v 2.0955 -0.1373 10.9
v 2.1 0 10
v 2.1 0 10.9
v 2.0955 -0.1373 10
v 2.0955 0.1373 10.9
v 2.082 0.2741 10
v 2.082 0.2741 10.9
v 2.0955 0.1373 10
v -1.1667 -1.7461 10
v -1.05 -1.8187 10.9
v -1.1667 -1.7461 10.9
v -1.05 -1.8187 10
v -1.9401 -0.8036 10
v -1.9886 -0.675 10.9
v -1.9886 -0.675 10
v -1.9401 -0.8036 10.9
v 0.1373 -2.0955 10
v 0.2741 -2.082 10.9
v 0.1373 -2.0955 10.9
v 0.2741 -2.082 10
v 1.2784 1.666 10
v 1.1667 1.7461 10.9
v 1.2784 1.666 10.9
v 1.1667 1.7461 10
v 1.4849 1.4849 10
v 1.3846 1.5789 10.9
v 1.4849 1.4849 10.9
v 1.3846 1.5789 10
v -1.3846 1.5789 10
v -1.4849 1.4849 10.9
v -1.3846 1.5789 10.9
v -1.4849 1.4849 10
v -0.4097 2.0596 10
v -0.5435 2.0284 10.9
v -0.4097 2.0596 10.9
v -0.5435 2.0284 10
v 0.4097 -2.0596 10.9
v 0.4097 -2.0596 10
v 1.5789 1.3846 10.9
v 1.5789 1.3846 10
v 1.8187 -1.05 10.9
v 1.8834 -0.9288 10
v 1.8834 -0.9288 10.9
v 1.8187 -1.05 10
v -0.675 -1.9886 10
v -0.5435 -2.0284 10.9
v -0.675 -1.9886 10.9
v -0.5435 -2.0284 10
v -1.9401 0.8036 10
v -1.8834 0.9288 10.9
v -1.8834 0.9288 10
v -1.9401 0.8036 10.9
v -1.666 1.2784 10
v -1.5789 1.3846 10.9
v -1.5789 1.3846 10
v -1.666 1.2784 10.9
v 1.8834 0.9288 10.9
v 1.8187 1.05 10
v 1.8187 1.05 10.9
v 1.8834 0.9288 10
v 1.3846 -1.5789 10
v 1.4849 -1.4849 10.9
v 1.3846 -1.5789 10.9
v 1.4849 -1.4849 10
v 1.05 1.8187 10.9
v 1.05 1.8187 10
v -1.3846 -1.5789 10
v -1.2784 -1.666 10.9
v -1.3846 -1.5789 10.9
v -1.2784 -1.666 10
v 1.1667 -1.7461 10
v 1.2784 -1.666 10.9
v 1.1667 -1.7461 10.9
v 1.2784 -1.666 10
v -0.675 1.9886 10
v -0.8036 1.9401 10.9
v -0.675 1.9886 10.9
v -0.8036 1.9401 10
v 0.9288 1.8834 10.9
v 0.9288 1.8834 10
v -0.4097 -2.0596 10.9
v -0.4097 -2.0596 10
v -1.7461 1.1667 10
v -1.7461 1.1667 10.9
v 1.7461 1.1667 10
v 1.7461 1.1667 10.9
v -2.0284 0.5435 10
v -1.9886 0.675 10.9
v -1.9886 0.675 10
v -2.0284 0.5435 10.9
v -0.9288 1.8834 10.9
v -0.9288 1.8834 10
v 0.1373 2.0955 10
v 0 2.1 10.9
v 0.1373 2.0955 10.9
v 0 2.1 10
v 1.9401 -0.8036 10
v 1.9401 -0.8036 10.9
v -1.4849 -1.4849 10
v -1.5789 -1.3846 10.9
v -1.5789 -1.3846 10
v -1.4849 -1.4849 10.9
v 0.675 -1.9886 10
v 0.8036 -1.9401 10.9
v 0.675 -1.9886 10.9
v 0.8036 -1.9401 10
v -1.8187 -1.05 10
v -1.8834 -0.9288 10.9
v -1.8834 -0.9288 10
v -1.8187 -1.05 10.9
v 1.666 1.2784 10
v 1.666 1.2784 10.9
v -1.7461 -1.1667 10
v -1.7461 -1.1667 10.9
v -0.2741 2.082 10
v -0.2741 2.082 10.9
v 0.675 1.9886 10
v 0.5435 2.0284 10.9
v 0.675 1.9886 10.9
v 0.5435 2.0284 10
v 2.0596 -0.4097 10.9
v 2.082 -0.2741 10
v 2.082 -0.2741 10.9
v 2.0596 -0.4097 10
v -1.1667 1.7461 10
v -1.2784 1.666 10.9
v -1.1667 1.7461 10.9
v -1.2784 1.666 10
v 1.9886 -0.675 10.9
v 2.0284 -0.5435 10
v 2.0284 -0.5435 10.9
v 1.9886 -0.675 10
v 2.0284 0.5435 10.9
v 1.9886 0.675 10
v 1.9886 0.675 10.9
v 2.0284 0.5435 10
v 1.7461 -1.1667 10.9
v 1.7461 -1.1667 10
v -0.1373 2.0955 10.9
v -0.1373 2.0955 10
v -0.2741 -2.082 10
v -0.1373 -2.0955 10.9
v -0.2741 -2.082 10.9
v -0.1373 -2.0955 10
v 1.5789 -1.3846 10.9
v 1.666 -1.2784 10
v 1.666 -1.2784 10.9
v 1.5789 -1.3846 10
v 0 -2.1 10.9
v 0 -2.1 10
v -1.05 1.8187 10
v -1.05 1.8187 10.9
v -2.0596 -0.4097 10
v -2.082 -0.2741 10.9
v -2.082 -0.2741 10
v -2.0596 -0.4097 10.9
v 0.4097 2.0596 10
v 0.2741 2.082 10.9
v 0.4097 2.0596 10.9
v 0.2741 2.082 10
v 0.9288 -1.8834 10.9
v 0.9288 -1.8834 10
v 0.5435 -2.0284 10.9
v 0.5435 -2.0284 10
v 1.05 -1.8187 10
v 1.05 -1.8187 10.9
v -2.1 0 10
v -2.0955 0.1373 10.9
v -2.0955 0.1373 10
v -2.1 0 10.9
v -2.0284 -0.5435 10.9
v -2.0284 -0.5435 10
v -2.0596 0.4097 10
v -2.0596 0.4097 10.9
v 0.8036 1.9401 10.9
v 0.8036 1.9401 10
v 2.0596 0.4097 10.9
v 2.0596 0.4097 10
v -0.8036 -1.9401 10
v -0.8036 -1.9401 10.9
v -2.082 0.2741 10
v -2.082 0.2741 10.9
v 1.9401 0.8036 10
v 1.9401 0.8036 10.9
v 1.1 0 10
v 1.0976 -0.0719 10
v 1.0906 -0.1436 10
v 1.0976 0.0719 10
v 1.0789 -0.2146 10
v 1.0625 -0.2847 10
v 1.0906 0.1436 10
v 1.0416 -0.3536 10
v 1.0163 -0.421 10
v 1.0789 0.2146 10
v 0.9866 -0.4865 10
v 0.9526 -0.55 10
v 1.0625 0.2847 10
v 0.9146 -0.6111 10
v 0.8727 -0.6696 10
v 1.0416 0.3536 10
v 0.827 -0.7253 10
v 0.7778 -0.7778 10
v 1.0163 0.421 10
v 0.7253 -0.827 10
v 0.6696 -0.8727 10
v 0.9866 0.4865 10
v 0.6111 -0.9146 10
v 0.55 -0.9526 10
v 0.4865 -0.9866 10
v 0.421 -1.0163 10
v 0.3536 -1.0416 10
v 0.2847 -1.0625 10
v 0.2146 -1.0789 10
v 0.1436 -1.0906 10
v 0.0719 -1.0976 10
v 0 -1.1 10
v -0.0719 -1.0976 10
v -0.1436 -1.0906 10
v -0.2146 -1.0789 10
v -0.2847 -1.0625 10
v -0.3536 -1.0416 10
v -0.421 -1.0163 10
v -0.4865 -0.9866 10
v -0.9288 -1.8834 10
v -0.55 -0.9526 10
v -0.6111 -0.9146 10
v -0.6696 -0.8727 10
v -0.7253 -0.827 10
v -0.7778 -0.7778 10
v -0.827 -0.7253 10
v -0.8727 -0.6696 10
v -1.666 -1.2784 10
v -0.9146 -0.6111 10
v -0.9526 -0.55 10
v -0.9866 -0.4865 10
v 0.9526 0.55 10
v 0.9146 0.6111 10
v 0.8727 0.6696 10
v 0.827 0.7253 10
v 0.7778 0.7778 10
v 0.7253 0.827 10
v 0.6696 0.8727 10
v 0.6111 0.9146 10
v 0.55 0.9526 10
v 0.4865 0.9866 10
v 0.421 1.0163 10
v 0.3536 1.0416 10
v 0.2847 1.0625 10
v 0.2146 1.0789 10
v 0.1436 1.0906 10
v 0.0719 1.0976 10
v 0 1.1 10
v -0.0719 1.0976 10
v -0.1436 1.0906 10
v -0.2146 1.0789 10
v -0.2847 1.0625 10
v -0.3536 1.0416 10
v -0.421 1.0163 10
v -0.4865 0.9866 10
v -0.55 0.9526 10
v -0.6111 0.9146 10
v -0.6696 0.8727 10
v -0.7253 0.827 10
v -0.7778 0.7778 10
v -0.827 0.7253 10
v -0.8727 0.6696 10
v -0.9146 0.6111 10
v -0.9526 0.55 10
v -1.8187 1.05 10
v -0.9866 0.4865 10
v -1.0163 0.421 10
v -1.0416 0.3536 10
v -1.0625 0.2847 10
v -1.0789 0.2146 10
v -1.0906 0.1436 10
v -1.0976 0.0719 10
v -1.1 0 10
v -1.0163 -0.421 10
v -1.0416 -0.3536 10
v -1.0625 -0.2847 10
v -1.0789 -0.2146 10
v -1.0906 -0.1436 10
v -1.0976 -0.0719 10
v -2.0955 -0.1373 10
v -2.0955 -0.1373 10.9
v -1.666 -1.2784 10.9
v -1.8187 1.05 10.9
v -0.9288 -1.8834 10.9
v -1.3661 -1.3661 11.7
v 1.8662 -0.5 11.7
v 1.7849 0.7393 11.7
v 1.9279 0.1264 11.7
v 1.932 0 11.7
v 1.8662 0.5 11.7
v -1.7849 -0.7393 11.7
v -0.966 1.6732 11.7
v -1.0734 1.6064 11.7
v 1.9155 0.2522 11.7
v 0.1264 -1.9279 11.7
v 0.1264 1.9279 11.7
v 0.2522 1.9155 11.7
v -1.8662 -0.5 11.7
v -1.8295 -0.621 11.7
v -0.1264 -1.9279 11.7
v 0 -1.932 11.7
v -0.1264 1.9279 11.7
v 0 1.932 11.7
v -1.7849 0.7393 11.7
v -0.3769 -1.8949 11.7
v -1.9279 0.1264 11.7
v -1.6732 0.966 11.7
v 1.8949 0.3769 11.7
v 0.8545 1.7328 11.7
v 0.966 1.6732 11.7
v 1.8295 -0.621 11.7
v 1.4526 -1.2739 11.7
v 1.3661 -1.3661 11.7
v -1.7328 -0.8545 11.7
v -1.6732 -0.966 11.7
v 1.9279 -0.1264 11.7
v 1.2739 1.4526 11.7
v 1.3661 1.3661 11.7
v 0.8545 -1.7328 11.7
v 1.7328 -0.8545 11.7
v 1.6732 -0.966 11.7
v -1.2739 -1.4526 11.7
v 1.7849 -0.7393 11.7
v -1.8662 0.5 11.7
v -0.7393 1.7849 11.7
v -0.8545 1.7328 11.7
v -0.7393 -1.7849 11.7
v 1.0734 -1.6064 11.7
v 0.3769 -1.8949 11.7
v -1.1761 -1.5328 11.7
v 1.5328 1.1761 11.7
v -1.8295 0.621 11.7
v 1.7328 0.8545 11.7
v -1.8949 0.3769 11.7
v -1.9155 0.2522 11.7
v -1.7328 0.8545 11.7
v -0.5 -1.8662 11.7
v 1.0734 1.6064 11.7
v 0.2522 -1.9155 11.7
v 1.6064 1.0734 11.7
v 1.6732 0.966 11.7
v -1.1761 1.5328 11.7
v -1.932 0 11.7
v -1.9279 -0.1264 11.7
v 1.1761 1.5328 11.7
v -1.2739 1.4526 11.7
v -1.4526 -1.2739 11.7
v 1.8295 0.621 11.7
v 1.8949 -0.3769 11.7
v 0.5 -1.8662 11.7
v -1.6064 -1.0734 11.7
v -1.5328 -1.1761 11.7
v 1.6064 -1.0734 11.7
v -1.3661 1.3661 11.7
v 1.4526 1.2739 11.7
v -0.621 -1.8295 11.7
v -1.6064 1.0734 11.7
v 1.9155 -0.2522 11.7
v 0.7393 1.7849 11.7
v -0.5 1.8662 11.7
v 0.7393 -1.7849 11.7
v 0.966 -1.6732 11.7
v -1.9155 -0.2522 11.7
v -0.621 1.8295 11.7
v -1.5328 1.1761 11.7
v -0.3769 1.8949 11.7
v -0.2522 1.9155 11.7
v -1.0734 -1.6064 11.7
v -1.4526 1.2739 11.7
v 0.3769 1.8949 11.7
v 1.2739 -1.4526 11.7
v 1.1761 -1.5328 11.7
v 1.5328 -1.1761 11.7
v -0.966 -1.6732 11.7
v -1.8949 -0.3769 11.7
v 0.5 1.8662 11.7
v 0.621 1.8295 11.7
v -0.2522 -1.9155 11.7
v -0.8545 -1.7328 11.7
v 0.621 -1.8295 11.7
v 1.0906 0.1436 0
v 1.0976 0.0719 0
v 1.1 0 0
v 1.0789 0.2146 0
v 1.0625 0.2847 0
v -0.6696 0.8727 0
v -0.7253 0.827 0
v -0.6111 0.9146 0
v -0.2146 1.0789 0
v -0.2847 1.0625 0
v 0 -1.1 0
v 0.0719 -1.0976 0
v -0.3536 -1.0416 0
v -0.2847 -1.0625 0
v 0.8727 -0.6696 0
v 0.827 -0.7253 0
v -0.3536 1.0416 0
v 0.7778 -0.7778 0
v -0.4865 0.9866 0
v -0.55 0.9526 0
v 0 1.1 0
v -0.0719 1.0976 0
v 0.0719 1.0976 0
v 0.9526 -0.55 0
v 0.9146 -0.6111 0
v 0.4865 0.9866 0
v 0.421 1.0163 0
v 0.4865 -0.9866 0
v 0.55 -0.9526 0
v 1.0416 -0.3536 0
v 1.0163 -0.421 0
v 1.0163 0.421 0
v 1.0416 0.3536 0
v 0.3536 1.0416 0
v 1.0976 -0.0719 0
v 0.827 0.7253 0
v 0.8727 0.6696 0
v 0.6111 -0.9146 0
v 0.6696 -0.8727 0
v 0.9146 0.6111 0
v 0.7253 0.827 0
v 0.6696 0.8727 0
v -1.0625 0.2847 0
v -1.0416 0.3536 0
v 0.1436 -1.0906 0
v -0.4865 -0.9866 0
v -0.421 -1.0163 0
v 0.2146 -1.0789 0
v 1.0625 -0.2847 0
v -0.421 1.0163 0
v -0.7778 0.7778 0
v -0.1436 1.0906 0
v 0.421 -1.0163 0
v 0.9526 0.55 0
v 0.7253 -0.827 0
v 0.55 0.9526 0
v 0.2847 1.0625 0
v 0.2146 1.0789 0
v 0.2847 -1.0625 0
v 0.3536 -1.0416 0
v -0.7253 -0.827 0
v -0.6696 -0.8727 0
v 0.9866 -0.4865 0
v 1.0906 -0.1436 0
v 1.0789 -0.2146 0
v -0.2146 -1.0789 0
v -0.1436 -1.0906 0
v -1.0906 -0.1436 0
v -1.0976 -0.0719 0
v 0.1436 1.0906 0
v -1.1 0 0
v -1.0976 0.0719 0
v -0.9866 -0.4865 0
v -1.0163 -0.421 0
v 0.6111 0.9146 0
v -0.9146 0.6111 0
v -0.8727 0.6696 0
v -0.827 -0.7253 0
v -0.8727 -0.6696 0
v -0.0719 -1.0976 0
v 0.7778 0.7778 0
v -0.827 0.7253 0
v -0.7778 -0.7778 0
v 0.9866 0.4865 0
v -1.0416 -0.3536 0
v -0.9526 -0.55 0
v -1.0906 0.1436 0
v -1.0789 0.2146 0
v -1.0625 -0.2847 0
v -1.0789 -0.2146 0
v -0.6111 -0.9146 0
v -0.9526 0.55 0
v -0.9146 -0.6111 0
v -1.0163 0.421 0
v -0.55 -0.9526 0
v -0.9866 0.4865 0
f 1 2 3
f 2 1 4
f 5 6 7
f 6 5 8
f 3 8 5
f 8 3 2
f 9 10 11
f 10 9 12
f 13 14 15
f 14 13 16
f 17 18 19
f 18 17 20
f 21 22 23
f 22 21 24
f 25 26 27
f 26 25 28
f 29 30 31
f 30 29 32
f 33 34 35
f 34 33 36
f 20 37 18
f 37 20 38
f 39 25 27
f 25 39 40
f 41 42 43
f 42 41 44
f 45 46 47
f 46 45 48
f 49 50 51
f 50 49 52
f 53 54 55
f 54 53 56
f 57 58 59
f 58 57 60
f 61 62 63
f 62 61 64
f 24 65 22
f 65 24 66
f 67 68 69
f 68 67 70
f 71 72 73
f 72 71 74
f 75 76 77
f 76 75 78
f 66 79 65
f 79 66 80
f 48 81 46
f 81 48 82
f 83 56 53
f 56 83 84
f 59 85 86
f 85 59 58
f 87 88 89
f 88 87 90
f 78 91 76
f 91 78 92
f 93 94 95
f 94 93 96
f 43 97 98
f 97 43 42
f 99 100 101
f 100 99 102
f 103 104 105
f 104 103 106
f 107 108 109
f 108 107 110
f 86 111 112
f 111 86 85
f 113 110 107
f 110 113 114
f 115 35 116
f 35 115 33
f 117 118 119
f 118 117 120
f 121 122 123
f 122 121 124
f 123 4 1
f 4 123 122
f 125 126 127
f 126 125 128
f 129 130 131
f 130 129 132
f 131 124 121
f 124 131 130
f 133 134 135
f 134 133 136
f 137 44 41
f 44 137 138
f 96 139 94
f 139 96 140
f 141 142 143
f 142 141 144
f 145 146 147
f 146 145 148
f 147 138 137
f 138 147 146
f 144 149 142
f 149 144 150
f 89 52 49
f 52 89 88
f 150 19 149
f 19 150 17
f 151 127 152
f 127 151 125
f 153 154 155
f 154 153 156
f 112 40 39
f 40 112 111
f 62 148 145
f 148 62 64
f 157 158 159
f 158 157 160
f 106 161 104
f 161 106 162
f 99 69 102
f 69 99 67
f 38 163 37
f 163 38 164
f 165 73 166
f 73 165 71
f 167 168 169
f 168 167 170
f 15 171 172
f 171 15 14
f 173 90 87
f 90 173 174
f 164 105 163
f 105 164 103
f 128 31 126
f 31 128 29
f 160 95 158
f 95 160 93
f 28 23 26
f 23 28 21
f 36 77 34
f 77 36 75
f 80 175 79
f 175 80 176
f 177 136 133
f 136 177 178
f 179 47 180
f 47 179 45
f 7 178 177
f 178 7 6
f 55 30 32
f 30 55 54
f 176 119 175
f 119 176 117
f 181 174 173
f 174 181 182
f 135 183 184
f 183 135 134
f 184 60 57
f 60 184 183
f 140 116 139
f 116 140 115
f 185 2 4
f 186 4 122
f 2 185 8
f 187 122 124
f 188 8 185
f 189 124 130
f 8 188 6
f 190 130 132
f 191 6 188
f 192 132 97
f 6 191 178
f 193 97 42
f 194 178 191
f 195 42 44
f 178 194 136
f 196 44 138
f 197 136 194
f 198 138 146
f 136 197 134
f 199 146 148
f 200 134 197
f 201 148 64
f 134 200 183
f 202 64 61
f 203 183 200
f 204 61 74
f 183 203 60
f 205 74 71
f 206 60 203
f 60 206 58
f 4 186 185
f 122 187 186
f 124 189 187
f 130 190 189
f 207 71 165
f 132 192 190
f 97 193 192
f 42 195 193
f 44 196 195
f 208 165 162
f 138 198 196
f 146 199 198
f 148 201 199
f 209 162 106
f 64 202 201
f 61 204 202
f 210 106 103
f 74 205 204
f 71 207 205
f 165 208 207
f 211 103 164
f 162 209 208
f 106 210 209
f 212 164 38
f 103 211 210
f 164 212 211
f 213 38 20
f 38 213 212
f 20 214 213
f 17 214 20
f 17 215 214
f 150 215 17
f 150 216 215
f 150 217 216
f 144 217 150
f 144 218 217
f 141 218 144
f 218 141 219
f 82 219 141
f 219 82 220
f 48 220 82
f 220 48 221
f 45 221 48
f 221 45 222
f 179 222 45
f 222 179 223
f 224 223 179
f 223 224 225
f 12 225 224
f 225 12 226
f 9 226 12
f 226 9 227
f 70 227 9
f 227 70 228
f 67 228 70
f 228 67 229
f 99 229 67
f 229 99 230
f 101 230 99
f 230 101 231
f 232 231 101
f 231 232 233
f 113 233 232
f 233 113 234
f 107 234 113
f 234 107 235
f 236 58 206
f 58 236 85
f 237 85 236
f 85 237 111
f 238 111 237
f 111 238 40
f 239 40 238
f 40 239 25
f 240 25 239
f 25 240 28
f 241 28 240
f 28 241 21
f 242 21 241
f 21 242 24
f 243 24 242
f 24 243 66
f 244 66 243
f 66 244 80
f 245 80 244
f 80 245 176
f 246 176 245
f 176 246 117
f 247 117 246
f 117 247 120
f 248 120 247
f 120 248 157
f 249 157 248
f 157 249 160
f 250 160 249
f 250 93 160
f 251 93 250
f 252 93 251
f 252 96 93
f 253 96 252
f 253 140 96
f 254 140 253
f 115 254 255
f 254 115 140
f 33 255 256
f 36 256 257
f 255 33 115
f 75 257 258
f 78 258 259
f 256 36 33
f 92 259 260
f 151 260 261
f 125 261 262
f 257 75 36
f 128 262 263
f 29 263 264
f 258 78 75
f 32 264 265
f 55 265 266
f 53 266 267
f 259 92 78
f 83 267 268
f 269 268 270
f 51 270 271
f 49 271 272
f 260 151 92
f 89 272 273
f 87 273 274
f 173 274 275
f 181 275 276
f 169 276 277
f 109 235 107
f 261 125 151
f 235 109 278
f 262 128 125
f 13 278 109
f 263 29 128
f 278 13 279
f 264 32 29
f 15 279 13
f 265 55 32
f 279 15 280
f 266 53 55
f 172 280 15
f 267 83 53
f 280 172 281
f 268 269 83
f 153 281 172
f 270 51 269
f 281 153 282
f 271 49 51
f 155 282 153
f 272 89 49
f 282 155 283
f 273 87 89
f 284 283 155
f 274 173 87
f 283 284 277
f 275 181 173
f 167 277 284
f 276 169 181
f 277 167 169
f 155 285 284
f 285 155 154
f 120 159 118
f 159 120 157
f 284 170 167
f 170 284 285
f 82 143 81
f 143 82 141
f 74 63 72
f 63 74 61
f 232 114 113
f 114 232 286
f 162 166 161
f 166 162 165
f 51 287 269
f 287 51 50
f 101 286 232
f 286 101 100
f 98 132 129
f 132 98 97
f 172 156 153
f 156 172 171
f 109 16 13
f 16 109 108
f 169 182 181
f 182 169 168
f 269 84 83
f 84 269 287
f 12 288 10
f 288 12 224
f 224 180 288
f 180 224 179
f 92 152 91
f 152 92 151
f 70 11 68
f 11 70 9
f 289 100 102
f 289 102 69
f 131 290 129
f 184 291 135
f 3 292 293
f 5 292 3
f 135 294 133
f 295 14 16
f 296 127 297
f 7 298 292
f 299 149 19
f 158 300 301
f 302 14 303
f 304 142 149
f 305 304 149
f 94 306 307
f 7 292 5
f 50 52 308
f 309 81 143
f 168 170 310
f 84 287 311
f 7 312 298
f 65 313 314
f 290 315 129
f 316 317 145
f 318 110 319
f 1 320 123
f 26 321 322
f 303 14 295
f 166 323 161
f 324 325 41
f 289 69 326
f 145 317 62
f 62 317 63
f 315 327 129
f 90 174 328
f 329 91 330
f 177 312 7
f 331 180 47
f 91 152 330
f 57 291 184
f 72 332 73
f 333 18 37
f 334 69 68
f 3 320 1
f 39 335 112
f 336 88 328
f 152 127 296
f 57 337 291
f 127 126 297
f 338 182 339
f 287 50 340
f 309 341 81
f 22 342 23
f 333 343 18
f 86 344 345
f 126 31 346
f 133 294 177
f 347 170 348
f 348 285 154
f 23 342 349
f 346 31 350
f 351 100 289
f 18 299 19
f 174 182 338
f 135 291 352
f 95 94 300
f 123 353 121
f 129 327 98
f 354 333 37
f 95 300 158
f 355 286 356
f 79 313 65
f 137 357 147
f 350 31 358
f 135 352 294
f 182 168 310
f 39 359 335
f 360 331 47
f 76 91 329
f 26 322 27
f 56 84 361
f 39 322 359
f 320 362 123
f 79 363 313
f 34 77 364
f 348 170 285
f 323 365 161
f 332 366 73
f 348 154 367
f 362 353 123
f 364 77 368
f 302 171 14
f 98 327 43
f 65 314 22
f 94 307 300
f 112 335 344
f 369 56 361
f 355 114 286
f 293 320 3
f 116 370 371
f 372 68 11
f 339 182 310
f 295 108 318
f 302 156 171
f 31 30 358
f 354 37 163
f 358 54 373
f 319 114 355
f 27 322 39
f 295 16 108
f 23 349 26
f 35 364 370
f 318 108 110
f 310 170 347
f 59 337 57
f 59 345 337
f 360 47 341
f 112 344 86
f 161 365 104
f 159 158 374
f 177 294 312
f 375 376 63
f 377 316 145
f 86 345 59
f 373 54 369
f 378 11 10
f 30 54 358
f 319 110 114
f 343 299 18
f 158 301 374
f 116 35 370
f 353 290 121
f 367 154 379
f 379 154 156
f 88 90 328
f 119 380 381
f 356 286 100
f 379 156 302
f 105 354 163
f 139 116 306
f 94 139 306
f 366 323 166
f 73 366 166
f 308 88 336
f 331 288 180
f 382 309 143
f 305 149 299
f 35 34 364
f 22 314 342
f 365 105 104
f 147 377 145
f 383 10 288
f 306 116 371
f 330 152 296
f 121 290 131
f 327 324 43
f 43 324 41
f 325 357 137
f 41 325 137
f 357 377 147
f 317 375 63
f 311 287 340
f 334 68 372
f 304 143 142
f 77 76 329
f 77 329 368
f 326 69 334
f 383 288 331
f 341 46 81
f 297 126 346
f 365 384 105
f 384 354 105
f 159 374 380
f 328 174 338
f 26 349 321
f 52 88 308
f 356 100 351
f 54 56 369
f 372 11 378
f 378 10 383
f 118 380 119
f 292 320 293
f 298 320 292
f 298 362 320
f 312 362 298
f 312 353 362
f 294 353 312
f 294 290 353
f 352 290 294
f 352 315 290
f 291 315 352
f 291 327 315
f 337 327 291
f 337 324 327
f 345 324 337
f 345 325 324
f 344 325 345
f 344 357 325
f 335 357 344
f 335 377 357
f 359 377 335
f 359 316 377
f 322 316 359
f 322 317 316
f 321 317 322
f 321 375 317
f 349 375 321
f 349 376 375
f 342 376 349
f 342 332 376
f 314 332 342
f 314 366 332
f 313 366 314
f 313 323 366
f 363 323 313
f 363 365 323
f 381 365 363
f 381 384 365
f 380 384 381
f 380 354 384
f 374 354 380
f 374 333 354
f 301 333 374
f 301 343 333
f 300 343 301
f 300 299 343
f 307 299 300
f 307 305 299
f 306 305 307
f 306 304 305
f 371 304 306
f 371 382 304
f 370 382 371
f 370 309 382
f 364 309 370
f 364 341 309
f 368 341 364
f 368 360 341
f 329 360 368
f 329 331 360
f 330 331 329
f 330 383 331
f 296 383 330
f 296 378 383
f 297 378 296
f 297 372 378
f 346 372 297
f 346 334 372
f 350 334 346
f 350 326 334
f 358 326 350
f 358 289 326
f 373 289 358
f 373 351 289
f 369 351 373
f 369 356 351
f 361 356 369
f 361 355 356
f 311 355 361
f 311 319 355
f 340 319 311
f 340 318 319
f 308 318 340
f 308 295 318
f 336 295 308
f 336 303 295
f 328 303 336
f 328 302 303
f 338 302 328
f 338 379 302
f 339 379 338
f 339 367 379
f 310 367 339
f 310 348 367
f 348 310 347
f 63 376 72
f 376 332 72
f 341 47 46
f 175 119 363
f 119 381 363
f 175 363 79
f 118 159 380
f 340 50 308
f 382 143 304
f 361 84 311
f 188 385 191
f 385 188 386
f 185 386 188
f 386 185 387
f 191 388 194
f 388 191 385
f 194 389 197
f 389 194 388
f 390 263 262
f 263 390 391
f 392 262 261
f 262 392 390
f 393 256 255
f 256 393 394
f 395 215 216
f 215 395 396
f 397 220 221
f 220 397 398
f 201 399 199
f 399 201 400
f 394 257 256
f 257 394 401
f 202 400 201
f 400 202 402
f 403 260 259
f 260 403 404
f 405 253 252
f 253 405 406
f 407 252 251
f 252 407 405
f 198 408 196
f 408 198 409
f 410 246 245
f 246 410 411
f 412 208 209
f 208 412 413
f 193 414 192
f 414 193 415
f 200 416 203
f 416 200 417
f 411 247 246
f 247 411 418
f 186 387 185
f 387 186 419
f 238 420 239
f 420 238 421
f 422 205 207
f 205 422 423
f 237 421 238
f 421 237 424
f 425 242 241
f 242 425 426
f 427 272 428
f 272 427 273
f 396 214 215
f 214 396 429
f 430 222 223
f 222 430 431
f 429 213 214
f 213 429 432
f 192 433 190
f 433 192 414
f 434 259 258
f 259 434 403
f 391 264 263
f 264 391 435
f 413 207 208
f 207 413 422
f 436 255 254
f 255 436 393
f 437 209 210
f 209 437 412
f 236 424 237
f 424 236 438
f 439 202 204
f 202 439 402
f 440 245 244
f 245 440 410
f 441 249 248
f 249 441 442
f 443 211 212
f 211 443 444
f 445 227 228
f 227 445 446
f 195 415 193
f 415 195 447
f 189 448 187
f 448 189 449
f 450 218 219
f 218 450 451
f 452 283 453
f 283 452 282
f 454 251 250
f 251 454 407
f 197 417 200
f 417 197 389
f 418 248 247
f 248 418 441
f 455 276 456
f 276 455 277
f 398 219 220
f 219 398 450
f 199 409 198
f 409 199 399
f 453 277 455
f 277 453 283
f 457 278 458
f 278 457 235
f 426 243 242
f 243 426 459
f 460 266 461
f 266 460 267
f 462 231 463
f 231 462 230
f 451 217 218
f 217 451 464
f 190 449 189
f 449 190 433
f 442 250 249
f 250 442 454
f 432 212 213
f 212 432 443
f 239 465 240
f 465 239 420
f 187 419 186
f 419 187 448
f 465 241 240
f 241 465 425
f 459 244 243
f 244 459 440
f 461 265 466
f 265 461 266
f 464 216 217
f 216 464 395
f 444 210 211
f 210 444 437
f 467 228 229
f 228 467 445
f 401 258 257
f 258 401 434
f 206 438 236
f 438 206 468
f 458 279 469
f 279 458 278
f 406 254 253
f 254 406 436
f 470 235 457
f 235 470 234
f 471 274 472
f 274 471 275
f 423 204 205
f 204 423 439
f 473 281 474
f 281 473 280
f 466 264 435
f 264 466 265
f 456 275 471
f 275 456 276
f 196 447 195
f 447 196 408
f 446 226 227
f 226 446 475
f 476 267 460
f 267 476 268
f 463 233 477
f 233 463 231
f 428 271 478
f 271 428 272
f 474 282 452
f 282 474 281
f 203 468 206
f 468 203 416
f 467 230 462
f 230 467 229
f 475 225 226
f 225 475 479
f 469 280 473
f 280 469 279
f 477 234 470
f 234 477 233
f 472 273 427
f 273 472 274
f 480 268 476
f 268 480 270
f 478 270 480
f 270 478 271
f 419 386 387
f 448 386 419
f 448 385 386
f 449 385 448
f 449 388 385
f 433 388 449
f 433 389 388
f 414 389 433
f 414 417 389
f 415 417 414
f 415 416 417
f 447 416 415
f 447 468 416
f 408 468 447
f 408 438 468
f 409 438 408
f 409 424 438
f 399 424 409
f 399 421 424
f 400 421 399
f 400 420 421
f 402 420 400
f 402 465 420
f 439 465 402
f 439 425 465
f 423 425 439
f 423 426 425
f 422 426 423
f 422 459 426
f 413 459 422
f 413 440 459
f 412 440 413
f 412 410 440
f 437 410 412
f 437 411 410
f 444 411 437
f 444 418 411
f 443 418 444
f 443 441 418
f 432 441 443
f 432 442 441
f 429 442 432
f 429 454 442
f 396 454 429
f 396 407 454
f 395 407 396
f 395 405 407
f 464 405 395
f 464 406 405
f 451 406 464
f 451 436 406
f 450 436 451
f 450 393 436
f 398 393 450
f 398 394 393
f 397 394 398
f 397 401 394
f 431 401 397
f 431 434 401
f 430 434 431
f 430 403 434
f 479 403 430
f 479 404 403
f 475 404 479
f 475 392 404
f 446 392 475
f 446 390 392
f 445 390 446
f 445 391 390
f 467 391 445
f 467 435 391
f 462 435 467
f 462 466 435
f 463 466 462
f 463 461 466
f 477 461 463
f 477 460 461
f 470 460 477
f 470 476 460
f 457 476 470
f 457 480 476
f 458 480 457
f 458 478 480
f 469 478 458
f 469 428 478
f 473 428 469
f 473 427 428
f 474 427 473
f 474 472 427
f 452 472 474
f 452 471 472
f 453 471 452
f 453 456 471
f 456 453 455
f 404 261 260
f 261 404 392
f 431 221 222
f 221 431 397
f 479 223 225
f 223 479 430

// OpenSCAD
$fn = 96;

d_shaft = 2.2;
len = 10;

d_head = 4.2;
h_head = 1.7;

// Simple pan head profile parameters
h_cyl = 0.9;                 // cylindrical portion of head
h_dome = h_head - h_cyl;      // domed portion
d_top = d_head * 0.92;        // slightly smaller top diameter for dome

module pan_head_screw(d_shaft=2.2, len=10, d_head=4.2, h_head=1.7) {
    union() {
        // Shaft
        cylinder(d=d_shaft, h=len);

        // Head (pan)
        translate([0,0,len]) {
            union() {
                // Cylindrical skirt
                cylinder(d=d_head, h=h_cyl);

                // Domed top (frustum)
                translate([0,0,h_cyl])
                    cylinder(d1=d_head, d2=d_top, h=h_dome);
            }
        }
    }
}

pan_head_screw(d_shaft, len, d_head, h_head);
